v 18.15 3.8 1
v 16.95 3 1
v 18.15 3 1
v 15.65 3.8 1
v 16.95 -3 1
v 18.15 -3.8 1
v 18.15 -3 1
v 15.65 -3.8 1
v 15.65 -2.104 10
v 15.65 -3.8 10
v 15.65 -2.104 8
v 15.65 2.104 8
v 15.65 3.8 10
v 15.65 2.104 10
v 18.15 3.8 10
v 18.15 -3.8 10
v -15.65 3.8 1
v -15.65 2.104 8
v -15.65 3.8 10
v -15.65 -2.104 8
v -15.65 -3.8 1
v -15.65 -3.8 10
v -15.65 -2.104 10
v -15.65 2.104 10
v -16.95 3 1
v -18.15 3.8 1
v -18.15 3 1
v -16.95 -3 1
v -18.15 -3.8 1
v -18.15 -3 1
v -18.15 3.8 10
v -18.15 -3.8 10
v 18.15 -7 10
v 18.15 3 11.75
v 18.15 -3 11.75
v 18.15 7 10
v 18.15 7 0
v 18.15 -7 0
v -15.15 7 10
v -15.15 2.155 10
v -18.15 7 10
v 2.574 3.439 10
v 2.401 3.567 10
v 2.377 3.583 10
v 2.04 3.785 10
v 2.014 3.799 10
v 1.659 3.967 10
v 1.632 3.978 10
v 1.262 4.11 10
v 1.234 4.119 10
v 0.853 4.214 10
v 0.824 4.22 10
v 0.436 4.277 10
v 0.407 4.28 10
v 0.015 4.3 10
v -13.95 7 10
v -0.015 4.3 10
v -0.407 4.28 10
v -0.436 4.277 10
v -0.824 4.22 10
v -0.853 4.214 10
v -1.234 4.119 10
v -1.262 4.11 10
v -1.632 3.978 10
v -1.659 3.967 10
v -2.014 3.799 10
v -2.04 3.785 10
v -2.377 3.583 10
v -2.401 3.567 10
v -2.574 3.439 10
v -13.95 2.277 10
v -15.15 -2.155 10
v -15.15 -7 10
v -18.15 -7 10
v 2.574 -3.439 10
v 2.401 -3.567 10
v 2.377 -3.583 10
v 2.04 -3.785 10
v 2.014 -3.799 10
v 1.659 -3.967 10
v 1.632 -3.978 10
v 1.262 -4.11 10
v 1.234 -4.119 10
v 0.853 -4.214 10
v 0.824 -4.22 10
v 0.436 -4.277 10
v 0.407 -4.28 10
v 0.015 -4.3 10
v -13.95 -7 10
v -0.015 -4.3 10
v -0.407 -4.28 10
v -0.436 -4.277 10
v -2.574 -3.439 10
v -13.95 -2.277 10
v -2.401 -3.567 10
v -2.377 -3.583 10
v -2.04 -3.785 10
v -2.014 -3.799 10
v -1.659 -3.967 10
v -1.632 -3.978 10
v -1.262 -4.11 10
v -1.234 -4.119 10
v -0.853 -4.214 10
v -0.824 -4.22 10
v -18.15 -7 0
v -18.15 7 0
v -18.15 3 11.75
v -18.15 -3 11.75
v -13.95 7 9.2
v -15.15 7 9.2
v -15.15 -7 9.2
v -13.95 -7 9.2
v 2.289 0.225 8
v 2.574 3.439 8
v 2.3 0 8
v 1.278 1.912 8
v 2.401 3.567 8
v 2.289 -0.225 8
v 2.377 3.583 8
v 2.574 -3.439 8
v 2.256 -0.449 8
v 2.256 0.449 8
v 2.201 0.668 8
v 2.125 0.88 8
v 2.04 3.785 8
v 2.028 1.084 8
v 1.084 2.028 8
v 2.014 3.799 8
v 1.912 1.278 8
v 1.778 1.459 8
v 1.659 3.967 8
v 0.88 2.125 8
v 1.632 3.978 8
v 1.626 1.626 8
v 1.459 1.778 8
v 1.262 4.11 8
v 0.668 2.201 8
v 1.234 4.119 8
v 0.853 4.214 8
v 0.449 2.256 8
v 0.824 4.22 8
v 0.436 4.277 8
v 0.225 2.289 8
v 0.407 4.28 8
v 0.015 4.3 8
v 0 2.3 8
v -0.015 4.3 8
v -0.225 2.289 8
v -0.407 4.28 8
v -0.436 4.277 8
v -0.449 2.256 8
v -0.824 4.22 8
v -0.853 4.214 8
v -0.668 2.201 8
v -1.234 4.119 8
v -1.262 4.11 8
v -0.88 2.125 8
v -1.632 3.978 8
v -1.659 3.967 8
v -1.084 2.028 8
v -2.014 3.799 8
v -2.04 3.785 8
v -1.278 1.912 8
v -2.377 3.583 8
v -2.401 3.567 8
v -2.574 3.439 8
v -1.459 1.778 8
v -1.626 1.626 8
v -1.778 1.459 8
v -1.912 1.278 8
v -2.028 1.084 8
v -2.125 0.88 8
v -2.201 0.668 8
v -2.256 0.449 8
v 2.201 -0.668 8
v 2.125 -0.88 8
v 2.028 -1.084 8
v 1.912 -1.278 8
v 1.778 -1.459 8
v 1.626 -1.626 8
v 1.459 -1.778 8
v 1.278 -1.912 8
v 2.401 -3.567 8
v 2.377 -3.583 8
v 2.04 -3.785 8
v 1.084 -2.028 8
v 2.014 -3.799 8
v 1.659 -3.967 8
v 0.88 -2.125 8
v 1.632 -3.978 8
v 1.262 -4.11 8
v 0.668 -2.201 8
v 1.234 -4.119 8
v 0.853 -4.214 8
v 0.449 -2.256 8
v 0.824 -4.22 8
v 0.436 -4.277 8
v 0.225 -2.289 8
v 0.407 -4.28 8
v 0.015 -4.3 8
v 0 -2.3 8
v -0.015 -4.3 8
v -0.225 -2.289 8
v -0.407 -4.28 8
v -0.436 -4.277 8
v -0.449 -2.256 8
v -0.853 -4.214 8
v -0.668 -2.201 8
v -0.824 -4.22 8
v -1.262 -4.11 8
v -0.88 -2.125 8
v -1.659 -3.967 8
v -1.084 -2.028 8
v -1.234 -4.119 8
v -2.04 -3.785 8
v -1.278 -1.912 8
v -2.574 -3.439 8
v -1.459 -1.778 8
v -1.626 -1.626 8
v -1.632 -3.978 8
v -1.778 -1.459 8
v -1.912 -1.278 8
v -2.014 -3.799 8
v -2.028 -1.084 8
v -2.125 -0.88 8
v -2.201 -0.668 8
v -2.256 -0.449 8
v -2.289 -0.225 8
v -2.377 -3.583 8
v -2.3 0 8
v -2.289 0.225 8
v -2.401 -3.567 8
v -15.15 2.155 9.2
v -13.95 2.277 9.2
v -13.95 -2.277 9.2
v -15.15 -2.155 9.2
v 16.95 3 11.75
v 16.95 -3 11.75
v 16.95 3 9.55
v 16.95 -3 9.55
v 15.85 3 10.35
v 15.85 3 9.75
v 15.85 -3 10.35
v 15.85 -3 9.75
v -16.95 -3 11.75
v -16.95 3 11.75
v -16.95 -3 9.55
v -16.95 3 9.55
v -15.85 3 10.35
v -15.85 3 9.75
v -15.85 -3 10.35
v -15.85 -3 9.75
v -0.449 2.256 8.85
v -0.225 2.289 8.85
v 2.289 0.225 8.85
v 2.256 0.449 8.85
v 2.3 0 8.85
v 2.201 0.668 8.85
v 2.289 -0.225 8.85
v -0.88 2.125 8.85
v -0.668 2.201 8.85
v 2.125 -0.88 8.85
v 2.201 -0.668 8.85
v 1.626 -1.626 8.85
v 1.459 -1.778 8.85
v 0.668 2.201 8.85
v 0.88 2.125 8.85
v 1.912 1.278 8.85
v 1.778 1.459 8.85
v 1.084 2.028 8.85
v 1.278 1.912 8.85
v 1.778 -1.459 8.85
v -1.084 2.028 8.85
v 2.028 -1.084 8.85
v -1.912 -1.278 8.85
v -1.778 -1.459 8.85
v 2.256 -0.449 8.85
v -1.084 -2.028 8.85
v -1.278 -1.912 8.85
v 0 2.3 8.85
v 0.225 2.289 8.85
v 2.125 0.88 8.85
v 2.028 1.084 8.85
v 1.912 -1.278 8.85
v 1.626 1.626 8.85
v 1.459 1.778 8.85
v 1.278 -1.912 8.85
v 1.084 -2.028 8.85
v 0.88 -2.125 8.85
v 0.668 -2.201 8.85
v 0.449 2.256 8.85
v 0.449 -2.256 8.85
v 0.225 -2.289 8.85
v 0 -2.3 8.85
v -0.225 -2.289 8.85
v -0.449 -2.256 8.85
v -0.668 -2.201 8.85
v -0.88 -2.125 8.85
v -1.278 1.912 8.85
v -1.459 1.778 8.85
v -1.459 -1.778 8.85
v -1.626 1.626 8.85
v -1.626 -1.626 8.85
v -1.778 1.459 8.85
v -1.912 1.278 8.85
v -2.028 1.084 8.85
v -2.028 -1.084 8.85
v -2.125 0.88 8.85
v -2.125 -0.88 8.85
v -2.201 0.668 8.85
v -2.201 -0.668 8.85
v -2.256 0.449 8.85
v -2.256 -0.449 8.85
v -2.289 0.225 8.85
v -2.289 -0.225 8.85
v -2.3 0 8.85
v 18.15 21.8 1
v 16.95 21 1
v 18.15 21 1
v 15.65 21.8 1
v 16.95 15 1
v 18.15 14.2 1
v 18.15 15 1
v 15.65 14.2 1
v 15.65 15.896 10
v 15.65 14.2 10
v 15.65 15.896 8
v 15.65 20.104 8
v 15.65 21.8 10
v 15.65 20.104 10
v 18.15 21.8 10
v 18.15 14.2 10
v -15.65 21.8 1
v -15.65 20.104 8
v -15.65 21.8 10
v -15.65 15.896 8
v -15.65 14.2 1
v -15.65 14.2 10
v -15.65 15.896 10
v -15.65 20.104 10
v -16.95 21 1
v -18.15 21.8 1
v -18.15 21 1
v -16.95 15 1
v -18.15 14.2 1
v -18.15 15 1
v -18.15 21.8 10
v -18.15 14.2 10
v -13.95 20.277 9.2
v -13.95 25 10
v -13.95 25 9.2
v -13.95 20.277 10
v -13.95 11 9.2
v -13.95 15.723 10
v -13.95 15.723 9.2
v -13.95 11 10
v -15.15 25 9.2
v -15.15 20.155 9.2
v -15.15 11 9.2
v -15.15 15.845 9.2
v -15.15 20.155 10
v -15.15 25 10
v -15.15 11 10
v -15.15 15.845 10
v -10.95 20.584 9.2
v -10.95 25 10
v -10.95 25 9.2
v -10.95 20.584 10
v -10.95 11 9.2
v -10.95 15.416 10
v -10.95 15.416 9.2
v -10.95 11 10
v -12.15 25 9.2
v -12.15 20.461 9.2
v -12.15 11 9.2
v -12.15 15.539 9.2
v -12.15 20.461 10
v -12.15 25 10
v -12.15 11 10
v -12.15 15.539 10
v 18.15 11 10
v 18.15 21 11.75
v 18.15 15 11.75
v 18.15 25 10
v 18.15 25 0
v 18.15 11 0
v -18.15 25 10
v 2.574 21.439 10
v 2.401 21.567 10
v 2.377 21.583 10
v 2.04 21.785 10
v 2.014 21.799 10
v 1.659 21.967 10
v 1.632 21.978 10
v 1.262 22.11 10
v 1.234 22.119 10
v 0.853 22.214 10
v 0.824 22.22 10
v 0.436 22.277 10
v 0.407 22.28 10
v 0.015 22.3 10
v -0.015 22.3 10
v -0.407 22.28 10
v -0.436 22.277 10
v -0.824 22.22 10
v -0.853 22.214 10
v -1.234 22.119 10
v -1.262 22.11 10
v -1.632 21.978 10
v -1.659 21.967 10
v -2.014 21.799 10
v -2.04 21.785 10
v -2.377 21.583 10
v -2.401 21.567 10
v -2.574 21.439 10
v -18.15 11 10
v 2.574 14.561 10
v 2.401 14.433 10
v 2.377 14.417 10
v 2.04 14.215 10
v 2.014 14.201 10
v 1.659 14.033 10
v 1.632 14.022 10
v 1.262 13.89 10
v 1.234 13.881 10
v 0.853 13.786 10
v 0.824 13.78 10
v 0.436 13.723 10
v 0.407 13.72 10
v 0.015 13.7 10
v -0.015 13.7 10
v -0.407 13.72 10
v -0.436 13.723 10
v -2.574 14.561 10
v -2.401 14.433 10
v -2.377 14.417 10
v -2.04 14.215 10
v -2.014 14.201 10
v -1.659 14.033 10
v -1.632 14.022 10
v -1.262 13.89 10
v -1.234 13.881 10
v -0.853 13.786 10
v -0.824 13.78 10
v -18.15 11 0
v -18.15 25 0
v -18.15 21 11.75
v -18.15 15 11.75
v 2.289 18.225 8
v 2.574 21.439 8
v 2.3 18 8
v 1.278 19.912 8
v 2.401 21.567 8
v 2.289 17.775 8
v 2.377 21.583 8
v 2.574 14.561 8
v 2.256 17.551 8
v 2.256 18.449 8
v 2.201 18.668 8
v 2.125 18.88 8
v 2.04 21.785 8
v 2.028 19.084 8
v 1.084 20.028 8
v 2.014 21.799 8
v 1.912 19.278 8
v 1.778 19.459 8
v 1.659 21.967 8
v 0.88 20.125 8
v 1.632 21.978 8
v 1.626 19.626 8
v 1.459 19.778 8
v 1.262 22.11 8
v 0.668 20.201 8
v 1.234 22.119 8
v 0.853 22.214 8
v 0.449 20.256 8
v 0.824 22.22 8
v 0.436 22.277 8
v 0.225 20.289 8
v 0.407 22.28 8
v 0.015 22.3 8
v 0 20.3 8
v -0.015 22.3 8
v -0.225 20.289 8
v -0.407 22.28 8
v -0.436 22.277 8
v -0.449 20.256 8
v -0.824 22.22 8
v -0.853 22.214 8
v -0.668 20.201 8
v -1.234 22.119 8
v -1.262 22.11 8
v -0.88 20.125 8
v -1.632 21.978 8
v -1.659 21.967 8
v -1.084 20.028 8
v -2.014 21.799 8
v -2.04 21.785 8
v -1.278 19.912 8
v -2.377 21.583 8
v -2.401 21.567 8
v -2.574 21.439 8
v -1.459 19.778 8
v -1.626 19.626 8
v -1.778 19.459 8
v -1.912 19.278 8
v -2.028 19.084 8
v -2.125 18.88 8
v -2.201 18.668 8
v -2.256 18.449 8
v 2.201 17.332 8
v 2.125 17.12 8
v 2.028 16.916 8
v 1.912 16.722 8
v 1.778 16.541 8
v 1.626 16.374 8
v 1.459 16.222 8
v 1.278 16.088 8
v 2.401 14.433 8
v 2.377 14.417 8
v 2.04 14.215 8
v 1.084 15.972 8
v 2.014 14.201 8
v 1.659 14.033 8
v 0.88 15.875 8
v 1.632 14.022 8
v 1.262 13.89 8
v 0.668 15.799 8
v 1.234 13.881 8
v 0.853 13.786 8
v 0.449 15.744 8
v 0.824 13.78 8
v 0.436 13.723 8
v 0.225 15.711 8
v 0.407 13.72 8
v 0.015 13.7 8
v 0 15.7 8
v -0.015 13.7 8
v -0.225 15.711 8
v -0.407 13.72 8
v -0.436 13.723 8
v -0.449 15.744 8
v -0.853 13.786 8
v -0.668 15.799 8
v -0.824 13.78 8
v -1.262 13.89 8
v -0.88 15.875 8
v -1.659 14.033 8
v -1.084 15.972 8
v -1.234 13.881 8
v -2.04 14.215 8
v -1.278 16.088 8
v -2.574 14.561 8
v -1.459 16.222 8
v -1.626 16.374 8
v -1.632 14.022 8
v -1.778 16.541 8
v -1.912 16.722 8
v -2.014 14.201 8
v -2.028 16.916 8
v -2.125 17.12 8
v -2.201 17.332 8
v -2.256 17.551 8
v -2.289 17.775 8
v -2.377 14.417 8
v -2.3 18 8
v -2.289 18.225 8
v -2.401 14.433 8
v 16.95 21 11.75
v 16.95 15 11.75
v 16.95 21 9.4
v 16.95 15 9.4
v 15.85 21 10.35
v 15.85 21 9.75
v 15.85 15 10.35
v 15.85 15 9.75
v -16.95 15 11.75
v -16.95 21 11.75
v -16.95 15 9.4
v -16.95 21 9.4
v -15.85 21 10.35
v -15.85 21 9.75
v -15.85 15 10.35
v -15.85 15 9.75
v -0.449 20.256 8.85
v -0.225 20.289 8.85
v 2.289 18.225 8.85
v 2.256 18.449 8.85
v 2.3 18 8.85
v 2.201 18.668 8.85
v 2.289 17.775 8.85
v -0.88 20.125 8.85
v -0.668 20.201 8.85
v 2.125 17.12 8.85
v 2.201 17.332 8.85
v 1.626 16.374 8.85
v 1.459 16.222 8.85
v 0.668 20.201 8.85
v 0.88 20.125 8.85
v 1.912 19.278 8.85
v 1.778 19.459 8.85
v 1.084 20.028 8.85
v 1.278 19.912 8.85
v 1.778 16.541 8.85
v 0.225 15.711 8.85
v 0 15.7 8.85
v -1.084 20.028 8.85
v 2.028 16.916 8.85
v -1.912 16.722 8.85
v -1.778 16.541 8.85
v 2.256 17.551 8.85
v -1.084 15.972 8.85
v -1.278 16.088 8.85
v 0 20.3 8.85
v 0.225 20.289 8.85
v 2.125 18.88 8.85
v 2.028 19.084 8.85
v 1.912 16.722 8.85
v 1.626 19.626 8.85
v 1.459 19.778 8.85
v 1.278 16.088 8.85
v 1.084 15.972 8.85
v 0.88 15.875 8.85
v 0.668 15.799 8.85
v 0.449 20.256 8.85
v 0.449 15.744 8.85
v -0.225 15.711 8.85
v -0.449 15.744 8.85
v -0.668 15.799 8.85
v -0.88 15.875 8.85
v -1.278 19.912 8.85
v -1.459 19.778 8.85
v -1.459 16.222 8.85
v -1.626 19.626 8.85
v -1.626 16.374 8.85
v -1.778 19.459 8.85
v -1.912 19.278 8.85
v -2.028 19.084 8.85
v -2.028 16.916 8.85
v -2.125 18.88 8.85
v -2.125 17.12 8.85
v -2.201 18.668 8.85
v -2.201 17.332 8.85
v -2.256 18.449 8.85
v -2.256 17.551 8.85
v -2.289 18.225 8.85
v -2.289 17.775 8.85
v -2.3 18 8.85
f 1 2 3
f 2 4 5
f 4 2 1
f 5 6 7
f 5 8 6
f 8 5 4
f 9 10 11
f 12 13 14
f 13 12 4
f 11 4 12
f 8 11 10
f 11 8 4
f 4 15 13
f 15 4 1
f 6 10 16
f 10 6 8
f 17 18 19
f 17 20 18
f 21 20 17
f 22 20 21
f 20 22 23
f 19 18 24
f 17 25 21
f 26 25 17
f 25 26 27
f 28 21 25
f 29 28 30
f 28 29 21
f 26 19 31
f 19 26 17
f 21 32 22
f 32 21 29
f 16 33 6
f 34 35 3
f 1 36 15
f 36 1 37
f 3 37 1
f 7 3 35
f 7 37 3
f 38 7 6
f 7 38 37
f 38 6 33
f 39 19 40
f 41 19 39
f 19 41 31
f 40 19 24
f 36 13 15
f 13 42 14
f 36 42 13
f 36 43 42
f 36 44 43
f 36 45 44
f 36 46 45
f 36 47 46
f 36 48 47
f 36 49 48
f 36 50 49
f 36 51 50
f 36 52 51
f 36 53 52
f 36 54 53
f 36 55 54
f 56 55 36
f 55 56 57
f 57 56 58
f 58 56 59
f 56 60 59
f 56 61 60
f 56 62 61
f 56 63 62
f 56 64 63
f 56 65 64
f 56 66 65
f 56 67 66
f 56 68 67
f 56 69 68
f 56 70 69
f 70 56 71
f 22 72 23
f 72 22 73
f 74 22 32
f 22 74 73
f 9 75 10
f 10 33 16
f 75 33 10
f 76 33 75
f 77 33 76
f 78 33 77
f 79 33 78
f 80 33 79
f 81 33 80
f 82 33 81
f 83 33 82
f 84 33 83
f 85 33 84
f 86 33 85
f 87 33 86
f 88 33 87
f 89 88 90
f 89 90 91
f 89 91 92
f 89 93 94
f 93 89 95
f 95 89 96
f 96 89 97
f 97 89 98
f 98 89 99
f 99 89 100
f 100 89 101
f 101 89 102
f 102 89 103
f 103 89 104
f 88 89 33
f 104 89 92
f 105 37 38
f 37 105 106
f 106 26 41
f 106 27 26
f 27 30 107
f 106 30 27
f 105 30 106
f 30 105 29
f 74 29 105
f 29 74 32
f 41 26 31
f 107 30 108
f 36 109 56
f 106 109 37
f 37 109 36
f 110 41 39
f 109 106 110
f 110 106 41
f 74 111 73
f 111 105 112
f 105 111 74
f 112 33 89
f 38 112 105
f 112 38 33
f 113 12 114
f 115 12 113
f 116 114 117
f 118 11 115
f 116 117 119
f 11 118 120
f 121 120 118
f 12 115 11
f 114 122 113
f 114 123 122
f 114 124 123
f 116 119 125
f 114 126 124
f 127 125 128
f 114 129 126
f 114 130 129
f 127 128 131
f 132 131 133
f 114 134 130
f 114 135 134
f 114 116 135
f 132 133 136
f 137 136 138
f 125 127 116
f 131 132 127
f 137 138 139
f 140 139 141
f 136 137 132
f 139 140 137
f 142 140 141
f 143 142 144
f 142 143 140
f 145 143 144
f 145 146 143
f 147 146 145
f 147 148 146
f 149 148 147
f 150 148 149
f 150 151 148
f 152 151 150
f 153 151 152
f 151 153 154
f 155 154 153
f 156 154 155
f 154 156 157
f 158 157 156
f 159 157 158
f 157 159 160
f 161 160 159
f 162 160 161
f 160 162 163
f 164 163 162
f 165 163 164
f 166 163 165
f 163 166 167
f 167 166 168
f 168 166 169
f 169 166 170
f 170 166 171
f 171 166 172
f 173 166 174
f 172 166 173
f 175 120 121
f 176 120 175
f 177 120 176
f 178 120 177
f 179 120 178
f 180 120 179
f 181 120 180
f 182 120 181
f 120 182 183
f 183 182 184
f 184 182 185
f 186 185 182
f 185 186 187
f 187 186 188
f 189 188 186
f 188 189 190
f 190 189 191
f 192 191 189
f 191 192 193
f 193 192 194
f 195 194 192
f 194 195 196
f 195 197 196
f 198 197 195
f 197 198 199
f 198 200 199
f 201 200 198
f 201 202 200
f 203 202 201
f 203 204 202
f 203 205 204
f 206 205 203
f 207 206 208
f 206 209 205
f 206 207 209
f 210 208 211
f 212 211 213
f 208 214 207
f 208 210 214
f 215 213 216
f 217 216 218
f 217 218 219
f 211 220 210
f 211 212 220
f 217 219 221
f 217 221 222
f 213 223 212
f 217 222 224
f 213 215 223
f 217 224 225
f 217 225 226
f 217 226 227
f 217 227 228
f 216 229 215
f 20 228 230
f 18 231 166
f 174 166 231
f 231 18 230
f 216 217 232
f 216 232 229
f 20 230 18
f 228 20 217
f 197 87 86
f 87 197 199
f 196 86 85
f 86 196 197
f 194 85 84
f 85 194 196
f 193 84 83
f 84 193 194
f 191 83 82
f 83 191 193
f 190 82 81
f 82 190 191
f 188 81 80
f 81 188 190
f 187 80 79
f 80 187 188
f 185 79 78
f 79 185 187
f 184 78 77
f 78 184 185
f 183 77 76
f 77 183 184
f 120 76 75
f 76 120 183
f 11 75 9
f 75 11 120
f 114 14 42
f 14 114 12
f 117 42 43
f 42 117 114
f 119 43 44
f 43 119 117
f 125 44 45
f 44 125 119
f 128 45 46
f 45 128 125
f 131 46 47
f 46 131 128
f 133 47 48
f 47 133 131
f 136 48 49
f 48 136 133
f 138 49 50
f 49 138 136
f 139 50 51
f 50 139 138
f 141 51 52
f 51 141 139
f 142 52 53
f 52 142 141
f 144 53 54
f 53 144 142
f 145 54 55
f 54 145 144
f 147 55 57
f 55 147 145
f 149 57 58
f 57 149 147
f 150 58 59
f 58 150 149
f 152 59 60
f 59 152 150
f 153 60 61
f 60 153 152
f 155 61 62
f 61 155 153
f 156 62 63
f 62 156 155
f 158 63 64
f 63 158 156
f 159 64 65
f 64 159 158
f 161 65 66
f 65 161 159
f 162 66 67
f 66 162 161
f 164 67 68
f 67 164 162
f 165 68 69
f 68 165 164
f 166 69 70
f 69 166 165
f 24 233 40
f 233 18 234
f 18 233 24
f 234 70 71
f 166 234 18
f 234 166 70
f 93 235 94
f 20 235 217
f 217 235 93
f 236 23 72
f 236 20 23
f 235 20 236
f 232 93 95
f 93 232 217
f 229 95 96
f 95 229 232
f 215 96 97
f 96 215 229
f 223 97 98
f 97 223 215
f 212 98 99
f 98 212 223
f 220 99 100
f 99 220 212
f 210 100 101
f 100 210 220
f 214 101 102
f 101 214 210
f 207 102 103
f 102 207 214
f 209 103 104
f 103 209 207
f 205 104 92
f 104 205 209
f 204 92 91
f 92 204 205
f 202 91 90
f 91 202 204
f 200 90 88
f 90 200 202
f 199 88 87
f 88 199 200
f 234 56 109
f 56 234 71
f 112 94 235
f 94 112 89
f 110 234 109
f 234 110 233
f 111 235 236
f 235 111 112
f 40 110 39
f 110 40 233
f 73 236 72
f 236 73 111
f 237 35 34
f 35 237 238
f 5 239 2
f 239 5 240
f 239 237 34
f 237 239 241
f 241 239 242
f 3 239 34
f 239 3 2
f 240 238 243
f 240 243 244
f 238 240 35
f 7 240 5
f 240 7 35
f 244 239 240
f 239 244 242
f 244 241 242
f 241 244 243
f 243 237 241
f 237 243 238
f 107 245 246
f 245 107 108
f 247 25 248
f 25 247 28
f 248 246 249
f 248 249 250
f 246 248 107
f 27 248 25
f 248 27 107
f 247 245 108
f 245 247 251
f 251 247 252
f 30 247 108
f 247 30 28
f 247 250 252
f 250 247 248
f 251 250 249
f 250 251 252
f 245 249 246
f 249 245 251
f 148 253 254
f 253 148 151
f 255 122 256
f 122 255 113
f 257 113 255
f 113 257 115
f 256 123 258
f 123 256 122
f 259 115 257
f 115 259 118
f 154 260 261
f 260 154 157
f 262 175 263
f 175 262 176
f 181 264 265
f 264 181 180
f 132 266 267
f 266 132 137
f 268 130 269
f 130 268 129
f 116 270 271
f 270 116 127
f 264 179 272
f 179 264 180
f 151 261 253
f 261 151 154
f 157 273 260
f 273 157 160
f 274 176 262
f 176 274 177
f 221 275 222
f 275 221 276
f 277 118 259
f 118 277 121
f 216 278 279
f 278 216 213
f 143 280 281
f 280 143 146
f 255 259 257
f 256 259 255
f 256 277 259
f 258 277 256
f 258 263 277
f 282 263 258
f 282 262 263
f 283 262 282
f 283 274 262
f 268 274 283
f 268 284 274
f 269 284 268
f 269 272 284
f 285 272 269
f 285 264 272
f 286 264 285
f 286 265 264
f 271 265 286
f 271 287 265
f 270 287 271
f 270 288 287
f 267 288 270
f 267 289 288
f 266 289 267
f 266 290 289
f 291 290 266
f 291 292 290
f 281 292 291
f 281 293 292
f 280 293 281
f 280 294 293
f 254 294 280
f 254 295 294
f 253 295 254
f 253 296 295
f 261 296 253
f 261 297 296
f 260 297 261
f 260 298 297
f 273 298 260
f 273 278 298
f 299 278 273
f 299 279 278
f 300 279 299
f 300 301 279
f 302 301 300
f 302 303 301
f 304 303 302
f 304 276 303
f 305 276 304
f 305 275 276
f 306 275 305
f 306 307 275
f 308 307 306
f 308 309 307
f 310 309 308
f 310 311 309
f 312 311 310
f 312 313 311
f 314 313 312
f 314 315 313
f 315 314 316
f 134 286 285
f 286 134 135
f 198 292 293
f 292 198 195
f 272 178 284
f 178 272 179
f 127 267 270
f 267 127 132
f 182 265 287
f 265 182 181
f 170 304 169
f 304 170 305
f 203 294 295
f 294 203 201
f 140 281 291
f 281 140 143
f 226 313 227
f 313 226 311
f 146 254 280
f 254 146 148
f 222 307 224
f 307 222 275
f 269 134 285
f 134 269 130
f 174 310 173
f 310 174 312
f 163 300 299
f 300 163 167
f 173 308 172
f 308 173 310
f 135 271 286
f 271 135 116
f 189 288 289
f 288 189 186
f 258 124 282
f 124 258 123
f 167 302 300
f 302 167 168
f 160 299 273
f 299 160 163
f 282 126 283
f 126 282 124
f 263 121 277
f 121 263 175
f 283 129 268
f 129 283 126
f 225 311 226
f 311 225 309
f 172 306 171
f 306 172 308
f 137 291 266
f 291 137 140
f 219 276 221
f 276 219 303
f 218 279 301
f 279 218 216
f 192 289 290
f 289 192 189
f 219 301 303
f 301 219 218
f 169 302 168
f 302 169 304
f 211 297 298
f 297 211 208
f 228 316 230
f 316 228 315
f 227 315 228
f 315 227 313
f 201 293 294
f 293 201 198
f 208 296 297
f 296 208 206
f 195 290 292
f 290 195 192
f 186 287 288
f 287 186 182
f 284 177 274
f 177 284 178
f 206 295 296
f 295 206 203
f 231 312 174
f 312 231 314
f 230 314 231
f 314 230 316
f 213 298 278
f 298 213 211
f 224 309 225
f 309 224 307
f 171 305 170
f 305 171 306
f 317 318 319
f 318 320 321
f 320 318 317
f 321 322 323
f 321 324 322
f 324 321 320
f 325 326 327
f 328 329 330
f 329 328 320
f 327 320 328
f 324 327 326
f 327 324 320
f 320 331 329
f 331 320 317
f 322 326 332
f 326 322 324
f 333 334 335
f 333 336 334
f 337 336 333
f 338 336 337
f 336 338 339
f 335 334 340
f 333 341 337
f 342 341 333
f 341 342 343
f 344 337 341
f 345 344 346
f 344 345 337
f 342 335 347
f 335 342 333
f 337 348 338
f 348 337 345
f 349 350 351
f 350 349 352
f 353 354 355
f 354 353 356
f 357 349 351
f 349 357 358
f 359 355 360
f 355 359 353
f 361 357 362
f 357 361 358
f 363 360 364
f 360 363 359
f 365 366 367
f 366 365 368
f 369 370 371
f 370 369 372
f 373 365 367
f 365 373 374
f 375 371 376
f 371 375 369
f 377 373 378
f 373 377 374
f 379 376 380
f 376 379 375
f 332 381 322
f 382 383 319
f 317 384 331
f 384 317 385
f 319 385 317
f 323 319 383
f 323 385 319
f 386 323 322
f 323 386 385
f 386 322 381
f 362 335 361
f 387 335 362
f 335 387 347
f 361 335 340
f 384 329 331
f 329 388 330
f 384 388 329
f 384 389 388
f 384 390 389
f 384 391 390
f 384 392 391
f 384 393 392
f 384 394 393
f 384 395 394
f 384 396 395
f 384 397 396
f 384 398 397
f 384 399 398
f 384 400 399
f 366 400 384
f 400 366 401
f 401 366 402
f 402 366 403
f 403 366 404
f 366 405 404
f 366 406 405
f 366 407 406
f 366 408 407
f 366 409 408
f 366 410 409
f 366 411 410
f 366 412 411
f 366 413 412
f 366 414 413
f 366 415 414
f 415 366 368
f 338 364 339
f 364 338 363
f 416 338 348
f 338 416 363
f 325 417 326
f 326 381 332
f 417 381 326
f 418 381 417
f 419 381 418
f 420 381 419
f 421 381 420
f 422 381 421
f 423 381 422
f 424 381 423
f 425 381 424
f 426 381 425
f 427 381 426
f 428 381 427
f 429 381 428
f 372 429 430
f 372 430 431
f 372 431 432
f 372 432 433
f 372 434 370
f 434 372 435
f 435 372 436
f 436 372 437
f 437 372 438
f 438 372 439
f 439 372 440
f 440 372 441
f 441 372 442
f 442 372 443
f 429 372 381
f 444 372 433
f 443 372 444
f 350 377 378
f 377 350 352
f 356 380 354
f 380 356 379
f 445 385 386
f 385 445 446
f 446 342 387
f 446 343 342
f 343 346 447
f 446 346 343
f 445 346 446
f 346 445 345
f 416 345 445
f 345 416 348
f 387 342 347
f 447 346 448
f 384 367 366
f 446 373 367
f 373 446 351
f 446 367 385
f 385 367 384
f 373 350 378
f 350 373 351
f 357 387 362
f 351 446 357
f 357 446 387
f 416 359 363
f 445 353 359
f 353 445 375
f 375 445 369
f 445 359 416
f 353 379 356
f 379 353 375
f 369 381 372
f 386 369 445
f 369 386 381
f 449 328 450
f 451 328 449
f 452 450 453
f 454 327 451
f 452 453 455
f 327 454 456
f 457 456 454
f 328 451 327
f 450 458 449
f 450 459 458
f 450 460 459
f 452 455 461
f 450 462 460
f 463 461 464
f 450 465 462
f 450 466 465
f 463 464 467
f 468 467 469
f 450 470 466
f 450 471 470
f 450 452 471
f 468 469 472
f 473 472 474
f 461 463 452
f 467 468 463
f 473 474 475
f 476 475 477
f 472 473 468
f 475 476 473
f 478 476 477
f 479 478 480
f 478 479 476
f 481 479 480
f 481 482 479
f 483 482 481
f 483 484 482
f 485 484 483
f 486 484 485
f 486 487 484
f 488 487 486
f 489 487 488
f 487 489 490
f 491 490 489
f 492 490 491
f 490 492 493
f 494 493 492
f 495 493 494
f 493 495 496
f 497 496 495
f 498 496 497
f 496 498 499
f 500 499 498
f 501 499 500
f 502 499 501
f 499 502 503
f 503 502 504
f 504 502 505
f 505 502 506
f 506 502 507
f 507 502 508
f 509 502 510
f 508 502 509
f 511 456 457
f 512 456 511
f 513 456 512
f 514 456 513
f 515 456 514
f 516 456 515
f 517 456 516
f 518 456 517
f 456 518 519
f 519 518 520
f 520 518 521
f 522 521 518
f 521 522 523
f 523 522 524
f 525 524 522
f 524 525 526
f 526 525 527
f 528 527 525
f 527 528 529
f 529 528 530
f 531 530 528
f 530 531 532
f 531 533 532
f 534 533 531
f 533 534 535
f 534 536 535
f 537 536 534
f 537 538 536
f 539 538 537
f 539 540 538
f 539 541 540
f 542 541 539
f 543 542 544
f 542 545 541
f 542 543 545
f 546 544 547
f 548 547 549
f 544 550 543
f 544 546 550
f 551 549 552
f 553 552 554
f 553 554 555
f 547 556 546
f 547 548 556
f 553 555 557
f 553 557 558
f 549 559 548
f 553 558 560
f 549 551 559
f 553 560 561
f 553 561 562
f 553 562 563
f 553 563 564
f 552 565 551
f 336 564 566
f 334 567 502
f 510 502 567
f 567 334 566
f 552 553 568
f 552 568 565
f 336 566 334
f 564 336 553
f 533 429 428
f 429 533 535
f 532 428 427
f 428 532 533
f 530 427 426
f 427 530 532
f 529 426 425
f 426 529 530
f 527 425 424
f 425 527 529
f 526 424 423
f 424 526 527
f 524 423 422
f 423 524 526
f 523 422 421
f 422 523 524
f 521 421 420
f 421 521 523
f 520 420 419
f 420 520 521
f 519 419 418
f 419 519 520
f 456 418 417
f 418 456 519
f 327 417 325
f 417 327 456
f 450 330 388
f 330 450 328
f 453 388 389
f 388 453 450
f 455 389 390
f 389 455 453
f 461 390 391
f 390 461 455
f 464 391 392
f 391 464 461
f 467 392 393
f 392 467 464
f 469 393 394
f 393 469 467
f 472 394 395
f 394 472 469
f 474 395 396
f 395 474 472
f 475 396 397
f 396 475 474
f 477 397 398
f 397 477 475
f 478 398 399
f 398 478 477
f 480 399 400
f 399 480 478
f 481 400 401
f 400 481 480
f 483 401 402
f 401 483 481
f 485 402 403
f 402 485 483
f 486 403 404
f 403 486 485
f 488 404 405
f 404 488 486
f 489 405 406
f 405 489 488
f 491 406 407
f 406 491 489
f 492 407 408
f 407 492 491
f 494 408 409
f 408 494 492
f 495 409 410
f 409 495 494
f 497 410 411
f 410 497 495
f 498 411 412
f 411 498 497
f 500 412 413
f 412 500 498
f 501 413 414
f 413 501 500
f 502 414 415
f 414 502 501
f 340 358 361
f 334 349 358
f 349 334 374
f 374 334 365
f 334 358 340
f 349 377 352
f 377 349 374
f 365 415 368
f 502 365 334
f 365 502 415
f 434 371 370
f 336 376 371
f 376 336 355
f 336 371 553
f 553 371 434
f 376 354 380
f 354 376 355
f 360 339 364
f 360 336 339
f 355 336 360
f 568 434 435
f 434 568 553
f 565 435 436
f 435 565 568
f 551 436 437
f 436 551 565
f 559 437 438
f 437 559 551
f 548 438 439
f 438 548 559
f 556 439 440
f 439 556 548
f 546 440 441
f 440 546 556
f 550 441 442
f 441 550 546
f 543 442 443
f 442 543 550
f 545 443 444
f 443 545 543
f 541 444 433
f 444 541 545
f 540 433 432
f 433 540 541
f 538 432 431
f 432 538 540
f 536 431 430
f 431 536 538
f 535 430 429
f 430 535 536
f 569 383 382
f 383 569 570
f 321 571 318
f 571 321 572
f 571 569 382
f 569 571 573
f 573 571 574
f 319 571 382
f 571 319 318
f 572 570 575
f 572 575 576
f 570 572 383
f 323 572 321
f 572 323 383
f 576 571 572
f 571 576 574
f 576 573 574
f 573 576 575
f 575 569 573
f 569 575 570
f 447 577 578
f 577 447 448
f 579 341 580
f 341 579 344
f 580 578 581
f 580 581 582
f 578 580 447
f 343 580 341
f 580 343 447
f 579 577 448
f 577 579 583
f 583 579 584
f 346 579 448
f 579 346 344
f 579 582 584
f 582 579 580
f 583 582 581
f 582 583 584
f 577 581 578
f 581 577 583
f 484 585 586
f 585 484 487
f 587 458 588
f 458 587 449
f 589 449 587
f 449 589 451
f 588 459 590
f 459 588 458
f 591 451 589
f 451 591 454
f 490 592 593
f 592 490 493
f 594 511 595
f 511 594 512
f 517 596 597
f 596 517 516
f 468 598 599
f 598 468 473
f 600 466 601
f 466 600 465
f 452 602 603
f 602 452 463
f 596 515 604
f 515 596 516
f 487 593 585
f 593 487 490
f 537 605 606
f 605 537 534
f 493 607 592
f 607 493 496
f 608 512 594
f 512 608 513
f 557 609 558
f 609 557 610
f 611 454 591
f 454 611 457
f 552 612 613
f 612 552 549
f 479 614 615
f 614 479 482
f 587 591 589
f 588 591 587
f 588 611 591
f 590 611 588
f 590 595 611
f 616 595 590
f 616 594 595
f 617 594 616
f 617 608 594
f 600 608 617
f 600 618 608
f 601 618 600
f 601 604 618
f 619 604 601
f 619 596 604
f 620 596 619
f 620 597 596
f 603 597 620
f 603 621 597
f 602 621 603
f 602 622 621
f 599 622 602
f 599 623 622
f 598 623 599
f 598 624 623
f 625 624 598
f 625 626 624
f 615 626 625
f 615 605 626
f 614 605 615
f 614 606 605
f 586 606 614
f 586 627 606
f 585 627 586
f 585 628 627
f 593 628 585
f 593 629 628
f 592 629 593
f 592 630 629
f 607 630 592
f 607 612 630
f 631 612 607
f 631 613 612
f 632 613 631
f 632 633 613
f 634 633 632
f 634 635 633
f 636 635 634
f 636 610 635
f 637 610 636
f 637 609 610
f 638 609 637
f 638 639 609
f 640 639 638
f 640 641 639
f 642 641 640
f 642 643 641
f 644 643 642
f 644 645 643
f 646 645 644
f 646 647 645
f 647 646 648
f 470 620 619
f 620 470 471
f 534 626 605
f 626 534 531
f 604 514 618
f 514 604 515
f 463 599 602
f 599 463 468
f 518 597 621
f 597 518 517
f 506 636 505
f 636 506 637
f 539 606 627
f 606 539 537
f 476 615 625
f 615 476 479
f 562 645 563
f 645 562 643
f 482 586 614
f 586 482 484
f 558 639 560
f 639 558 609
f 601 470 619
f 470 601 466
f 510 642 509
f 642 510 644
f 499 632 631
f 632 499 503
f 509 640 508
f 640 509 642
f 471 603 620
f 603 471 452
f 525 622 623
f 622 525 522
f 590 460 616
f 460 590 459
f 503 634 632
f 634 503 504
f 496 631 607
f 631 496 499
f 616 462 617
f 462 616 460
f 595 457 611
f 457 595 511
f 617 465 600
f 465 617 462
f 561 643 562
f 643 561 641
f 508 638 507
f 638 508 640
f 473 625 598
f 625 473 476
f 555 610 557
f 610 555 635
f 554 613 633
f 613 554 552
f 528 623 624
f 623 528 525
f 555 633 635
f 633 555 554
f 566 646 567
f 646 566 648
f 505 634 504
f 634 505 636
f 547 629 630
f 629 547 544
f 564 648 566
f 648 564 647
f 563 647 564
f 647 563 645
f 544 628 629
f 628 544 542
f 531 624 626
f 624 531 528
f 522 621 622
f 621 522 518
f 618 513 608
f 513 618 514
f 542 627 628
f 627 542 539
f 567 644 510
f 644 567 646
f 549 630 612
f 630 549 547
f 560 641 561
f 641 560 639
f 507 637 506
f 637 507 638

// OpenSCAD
// ホーン抜け止めスナップ爪のクーポン（固定案 B）。
// 現行 socket のホーンバーポケット（テーパー一文字＋ハブ＋中心スタブ）を
// ミニブロック上面に複製し、バー両端に片持ちのスナップ爪を追加した試験片。
// 爪の返し量 2 種を 1 枚に並べ、実ホーンをパチンと嵌めて
// 「入れやすさ・保持力・外す時に爪が折れないか」を確かめる。
// 上面の溝線 1 本 = 予圧 0.15、2 本 = 予圧 0.30（左端寄り・幅 1.2 の彫り線）。
// 印刷向きは本番同等（ポケット面を上・爪は縦。爪の曲げは積層を剥がす向きに
// なるため、耐久はこのクーポンでの実測が正）。
// v2: v1（返し 0.5/0.8 のナイフエッジ三角）は返しの薄い部分がスライサーで
// 消えて印刷物に「ひさし」ができず、ホーンに噛まなかった。先端に垂直面
// hs_hook_face を持つ角張った断面へ変更し、返しも増量した。
// v3: v2 は噛むが上下にガタが残った。返し下面を水平から「内向きに下がる
// くさび」に変え、爪が閉じ切る前に下面がバー上面へ食い込んで予圧が掛かる
// ようにする（あそび 0 で押さえ込む）。予圧量 2 種を比較する。

include <params.scad>

hs_variants = [ [1.1, 0.15], [1.1, 0.30] ]; // [返し overhang, 予圧(バー上面への食い込み)]
hs_tip_clear = 0.05;    // 返し先端下面とバー上面のすき間（先端は必ずバーを越えられる）
hs_hook_face = 0.6;     // 返し先端の垂直面高さ。ナイフエッジ化による印刷消失を防ぐ
hs_claw_w = 6;    // 爪の幅
hs_claw_t = 1.2;  // 爪の梁厚。返し 1.1 のたわみでも曲げ歪み ~2.6% に収まる
hs_root_z = 1.0;  // 爪の根元高さ。ここから上が撓む（梁長 ~8.8mm）
hs_block_h = 10;  // ブロック高。ポケット床 = hs_block_h - (horn_thick + horn_clearance)
hs_bw     = 14;   // ブロック奥行き
hs_lead   = 1.4;  // 返しの上の 45° 差し込みガイド高
hs_relief = 1.3;  // 爪内側の逃がし幅（爪をブロック本体から切り離す。>= 返し量）
hs_side   = 0.8;  // 爪の左右の逃がし

pocket_d = horn_thick + horn_clearance;  // ポケット深さ 2.0
floor_z  = hs_block_h - pocket_d;        // ポケット床
bar_x    = horn_arm_l + horn_clearance;  // バー端 = 爪の内面
lx       = 2 * (bar_x + hs_claw_t);      // ブロック全長（爪の外面が端）

// 現行 socket と同一のポケット 2D 形状（テーパー一文字バー＋ハブ円）
module horn_pocket_2d() {
  offset(r = horn_clearance)
    union() {
      polygon([
        [-horn_arm_l, -horn_arm_w_tip/2],
        [          0, -horn_arm_w_base/2],
        [ horn_arm_l, -horn_arm_w_tip/2],
        [ horn_arm_l,  horn_arm_w_tip/2],
        [          0,  horn_arm_w_base/2],
        [-horn_arm_l,  horn_arm_w_tip/2]
      ]);
      circle(d = horn_hub_d);
    }
}

// +X 側の爪。梁＋返し。返し下面は「爪面側が低いくさび」:
// 爪面側の下端はバー上面より preload だけ低く、先端側は tip_clear だけ高い。
// 爪が内側へ戻る途中で下面がバー上面に楔当たりし、あそび 0 の予圧で押さえる
module claw(hk, preload) {
  hz_lo = floor_z + horn_thick - preload;  // 返し下面の爪面側（バー上面より低い）
  wedge = preload + hs_tip_clear;          // 下面の傾き量（先端はバー上面を越える）
  translate([bar_x, -hs_claw_w/2, hs_root_z])
    cube([hs_claw_t, hs_claw_w, hz_lo + wedge + hs_hook_face + hs_lead - hs_root_z]);
  translate([bar_x, hs_claw_w/2, 0])
    rotate([90, 0, 0])
      linear_extrude(height = hs_claw_w)
        polygon([
          [  0, hz_lo],
          [-hk, hz_lo + wedge],
          [-hk, hz_lo + wedge + hs_hook_face],
          [  0, hz_lo + wedge + hs_hook_face + hs_lead],
        ]);
}

module snap_block(hk, preload, notches) {
  difference() {
    translate([-lx/2, -hs_bw/2, 0])
      cube([lx, hs_bw, hs_block_h]);
    // ポケット（上面から掘る）
    translate([0, 0, floor_z])
      linear_extrude(height = pocket_d + 0.1)
        horn_pocket_2d();
    // 爪の切り離し: 根元から上を内側・左右に逃がし、外側は端面で開放
    for (m = [0, 1]) mirror([m, 0, 0])
      translate([bar_x - hs_relief, -(hs_claw_w + 2*hs_side)/2, hs_root_z])
        cube([hs_relief + hs_claw_t + 0.1, hs_claw_w + 2*hs_side, hs_block_h]);
    // 変種判別の溝線（上面左端寄り。1 本=予圧0.15 / 2 本=予圧0.30）
    for (t = [0 : notches - 1])
      translate([-lx/2 + 3 + t * 3, -hs_bw/2 - 0.1, hs_block_h - 0.8])
        cube([1.2, hs_bw + 0.2, 0.9]);
  }
  // 爪（両端）。根元 z=hs_root_z で本体の棚に着地して融合する
  for (m = [0, 1]) mirror([m, 0, 0])
    claw(hk, preload);
  // 中心スタブ（本番同様: ホーン中心くぼみへ嵌合、床から horn_thick/2 突出）
  translate([0, 0, floor_z - 0.1])
    cylinder(d = horn_stub_d, h = horn_thick/2 + 0.1);
}

for (i = [0 : len(hs_variants) - 1])
  translate([0, i * (hs_bw + 4), 0])
    snap_block(hs_variants[i][0], hs_variants[i][1], i + 1);
